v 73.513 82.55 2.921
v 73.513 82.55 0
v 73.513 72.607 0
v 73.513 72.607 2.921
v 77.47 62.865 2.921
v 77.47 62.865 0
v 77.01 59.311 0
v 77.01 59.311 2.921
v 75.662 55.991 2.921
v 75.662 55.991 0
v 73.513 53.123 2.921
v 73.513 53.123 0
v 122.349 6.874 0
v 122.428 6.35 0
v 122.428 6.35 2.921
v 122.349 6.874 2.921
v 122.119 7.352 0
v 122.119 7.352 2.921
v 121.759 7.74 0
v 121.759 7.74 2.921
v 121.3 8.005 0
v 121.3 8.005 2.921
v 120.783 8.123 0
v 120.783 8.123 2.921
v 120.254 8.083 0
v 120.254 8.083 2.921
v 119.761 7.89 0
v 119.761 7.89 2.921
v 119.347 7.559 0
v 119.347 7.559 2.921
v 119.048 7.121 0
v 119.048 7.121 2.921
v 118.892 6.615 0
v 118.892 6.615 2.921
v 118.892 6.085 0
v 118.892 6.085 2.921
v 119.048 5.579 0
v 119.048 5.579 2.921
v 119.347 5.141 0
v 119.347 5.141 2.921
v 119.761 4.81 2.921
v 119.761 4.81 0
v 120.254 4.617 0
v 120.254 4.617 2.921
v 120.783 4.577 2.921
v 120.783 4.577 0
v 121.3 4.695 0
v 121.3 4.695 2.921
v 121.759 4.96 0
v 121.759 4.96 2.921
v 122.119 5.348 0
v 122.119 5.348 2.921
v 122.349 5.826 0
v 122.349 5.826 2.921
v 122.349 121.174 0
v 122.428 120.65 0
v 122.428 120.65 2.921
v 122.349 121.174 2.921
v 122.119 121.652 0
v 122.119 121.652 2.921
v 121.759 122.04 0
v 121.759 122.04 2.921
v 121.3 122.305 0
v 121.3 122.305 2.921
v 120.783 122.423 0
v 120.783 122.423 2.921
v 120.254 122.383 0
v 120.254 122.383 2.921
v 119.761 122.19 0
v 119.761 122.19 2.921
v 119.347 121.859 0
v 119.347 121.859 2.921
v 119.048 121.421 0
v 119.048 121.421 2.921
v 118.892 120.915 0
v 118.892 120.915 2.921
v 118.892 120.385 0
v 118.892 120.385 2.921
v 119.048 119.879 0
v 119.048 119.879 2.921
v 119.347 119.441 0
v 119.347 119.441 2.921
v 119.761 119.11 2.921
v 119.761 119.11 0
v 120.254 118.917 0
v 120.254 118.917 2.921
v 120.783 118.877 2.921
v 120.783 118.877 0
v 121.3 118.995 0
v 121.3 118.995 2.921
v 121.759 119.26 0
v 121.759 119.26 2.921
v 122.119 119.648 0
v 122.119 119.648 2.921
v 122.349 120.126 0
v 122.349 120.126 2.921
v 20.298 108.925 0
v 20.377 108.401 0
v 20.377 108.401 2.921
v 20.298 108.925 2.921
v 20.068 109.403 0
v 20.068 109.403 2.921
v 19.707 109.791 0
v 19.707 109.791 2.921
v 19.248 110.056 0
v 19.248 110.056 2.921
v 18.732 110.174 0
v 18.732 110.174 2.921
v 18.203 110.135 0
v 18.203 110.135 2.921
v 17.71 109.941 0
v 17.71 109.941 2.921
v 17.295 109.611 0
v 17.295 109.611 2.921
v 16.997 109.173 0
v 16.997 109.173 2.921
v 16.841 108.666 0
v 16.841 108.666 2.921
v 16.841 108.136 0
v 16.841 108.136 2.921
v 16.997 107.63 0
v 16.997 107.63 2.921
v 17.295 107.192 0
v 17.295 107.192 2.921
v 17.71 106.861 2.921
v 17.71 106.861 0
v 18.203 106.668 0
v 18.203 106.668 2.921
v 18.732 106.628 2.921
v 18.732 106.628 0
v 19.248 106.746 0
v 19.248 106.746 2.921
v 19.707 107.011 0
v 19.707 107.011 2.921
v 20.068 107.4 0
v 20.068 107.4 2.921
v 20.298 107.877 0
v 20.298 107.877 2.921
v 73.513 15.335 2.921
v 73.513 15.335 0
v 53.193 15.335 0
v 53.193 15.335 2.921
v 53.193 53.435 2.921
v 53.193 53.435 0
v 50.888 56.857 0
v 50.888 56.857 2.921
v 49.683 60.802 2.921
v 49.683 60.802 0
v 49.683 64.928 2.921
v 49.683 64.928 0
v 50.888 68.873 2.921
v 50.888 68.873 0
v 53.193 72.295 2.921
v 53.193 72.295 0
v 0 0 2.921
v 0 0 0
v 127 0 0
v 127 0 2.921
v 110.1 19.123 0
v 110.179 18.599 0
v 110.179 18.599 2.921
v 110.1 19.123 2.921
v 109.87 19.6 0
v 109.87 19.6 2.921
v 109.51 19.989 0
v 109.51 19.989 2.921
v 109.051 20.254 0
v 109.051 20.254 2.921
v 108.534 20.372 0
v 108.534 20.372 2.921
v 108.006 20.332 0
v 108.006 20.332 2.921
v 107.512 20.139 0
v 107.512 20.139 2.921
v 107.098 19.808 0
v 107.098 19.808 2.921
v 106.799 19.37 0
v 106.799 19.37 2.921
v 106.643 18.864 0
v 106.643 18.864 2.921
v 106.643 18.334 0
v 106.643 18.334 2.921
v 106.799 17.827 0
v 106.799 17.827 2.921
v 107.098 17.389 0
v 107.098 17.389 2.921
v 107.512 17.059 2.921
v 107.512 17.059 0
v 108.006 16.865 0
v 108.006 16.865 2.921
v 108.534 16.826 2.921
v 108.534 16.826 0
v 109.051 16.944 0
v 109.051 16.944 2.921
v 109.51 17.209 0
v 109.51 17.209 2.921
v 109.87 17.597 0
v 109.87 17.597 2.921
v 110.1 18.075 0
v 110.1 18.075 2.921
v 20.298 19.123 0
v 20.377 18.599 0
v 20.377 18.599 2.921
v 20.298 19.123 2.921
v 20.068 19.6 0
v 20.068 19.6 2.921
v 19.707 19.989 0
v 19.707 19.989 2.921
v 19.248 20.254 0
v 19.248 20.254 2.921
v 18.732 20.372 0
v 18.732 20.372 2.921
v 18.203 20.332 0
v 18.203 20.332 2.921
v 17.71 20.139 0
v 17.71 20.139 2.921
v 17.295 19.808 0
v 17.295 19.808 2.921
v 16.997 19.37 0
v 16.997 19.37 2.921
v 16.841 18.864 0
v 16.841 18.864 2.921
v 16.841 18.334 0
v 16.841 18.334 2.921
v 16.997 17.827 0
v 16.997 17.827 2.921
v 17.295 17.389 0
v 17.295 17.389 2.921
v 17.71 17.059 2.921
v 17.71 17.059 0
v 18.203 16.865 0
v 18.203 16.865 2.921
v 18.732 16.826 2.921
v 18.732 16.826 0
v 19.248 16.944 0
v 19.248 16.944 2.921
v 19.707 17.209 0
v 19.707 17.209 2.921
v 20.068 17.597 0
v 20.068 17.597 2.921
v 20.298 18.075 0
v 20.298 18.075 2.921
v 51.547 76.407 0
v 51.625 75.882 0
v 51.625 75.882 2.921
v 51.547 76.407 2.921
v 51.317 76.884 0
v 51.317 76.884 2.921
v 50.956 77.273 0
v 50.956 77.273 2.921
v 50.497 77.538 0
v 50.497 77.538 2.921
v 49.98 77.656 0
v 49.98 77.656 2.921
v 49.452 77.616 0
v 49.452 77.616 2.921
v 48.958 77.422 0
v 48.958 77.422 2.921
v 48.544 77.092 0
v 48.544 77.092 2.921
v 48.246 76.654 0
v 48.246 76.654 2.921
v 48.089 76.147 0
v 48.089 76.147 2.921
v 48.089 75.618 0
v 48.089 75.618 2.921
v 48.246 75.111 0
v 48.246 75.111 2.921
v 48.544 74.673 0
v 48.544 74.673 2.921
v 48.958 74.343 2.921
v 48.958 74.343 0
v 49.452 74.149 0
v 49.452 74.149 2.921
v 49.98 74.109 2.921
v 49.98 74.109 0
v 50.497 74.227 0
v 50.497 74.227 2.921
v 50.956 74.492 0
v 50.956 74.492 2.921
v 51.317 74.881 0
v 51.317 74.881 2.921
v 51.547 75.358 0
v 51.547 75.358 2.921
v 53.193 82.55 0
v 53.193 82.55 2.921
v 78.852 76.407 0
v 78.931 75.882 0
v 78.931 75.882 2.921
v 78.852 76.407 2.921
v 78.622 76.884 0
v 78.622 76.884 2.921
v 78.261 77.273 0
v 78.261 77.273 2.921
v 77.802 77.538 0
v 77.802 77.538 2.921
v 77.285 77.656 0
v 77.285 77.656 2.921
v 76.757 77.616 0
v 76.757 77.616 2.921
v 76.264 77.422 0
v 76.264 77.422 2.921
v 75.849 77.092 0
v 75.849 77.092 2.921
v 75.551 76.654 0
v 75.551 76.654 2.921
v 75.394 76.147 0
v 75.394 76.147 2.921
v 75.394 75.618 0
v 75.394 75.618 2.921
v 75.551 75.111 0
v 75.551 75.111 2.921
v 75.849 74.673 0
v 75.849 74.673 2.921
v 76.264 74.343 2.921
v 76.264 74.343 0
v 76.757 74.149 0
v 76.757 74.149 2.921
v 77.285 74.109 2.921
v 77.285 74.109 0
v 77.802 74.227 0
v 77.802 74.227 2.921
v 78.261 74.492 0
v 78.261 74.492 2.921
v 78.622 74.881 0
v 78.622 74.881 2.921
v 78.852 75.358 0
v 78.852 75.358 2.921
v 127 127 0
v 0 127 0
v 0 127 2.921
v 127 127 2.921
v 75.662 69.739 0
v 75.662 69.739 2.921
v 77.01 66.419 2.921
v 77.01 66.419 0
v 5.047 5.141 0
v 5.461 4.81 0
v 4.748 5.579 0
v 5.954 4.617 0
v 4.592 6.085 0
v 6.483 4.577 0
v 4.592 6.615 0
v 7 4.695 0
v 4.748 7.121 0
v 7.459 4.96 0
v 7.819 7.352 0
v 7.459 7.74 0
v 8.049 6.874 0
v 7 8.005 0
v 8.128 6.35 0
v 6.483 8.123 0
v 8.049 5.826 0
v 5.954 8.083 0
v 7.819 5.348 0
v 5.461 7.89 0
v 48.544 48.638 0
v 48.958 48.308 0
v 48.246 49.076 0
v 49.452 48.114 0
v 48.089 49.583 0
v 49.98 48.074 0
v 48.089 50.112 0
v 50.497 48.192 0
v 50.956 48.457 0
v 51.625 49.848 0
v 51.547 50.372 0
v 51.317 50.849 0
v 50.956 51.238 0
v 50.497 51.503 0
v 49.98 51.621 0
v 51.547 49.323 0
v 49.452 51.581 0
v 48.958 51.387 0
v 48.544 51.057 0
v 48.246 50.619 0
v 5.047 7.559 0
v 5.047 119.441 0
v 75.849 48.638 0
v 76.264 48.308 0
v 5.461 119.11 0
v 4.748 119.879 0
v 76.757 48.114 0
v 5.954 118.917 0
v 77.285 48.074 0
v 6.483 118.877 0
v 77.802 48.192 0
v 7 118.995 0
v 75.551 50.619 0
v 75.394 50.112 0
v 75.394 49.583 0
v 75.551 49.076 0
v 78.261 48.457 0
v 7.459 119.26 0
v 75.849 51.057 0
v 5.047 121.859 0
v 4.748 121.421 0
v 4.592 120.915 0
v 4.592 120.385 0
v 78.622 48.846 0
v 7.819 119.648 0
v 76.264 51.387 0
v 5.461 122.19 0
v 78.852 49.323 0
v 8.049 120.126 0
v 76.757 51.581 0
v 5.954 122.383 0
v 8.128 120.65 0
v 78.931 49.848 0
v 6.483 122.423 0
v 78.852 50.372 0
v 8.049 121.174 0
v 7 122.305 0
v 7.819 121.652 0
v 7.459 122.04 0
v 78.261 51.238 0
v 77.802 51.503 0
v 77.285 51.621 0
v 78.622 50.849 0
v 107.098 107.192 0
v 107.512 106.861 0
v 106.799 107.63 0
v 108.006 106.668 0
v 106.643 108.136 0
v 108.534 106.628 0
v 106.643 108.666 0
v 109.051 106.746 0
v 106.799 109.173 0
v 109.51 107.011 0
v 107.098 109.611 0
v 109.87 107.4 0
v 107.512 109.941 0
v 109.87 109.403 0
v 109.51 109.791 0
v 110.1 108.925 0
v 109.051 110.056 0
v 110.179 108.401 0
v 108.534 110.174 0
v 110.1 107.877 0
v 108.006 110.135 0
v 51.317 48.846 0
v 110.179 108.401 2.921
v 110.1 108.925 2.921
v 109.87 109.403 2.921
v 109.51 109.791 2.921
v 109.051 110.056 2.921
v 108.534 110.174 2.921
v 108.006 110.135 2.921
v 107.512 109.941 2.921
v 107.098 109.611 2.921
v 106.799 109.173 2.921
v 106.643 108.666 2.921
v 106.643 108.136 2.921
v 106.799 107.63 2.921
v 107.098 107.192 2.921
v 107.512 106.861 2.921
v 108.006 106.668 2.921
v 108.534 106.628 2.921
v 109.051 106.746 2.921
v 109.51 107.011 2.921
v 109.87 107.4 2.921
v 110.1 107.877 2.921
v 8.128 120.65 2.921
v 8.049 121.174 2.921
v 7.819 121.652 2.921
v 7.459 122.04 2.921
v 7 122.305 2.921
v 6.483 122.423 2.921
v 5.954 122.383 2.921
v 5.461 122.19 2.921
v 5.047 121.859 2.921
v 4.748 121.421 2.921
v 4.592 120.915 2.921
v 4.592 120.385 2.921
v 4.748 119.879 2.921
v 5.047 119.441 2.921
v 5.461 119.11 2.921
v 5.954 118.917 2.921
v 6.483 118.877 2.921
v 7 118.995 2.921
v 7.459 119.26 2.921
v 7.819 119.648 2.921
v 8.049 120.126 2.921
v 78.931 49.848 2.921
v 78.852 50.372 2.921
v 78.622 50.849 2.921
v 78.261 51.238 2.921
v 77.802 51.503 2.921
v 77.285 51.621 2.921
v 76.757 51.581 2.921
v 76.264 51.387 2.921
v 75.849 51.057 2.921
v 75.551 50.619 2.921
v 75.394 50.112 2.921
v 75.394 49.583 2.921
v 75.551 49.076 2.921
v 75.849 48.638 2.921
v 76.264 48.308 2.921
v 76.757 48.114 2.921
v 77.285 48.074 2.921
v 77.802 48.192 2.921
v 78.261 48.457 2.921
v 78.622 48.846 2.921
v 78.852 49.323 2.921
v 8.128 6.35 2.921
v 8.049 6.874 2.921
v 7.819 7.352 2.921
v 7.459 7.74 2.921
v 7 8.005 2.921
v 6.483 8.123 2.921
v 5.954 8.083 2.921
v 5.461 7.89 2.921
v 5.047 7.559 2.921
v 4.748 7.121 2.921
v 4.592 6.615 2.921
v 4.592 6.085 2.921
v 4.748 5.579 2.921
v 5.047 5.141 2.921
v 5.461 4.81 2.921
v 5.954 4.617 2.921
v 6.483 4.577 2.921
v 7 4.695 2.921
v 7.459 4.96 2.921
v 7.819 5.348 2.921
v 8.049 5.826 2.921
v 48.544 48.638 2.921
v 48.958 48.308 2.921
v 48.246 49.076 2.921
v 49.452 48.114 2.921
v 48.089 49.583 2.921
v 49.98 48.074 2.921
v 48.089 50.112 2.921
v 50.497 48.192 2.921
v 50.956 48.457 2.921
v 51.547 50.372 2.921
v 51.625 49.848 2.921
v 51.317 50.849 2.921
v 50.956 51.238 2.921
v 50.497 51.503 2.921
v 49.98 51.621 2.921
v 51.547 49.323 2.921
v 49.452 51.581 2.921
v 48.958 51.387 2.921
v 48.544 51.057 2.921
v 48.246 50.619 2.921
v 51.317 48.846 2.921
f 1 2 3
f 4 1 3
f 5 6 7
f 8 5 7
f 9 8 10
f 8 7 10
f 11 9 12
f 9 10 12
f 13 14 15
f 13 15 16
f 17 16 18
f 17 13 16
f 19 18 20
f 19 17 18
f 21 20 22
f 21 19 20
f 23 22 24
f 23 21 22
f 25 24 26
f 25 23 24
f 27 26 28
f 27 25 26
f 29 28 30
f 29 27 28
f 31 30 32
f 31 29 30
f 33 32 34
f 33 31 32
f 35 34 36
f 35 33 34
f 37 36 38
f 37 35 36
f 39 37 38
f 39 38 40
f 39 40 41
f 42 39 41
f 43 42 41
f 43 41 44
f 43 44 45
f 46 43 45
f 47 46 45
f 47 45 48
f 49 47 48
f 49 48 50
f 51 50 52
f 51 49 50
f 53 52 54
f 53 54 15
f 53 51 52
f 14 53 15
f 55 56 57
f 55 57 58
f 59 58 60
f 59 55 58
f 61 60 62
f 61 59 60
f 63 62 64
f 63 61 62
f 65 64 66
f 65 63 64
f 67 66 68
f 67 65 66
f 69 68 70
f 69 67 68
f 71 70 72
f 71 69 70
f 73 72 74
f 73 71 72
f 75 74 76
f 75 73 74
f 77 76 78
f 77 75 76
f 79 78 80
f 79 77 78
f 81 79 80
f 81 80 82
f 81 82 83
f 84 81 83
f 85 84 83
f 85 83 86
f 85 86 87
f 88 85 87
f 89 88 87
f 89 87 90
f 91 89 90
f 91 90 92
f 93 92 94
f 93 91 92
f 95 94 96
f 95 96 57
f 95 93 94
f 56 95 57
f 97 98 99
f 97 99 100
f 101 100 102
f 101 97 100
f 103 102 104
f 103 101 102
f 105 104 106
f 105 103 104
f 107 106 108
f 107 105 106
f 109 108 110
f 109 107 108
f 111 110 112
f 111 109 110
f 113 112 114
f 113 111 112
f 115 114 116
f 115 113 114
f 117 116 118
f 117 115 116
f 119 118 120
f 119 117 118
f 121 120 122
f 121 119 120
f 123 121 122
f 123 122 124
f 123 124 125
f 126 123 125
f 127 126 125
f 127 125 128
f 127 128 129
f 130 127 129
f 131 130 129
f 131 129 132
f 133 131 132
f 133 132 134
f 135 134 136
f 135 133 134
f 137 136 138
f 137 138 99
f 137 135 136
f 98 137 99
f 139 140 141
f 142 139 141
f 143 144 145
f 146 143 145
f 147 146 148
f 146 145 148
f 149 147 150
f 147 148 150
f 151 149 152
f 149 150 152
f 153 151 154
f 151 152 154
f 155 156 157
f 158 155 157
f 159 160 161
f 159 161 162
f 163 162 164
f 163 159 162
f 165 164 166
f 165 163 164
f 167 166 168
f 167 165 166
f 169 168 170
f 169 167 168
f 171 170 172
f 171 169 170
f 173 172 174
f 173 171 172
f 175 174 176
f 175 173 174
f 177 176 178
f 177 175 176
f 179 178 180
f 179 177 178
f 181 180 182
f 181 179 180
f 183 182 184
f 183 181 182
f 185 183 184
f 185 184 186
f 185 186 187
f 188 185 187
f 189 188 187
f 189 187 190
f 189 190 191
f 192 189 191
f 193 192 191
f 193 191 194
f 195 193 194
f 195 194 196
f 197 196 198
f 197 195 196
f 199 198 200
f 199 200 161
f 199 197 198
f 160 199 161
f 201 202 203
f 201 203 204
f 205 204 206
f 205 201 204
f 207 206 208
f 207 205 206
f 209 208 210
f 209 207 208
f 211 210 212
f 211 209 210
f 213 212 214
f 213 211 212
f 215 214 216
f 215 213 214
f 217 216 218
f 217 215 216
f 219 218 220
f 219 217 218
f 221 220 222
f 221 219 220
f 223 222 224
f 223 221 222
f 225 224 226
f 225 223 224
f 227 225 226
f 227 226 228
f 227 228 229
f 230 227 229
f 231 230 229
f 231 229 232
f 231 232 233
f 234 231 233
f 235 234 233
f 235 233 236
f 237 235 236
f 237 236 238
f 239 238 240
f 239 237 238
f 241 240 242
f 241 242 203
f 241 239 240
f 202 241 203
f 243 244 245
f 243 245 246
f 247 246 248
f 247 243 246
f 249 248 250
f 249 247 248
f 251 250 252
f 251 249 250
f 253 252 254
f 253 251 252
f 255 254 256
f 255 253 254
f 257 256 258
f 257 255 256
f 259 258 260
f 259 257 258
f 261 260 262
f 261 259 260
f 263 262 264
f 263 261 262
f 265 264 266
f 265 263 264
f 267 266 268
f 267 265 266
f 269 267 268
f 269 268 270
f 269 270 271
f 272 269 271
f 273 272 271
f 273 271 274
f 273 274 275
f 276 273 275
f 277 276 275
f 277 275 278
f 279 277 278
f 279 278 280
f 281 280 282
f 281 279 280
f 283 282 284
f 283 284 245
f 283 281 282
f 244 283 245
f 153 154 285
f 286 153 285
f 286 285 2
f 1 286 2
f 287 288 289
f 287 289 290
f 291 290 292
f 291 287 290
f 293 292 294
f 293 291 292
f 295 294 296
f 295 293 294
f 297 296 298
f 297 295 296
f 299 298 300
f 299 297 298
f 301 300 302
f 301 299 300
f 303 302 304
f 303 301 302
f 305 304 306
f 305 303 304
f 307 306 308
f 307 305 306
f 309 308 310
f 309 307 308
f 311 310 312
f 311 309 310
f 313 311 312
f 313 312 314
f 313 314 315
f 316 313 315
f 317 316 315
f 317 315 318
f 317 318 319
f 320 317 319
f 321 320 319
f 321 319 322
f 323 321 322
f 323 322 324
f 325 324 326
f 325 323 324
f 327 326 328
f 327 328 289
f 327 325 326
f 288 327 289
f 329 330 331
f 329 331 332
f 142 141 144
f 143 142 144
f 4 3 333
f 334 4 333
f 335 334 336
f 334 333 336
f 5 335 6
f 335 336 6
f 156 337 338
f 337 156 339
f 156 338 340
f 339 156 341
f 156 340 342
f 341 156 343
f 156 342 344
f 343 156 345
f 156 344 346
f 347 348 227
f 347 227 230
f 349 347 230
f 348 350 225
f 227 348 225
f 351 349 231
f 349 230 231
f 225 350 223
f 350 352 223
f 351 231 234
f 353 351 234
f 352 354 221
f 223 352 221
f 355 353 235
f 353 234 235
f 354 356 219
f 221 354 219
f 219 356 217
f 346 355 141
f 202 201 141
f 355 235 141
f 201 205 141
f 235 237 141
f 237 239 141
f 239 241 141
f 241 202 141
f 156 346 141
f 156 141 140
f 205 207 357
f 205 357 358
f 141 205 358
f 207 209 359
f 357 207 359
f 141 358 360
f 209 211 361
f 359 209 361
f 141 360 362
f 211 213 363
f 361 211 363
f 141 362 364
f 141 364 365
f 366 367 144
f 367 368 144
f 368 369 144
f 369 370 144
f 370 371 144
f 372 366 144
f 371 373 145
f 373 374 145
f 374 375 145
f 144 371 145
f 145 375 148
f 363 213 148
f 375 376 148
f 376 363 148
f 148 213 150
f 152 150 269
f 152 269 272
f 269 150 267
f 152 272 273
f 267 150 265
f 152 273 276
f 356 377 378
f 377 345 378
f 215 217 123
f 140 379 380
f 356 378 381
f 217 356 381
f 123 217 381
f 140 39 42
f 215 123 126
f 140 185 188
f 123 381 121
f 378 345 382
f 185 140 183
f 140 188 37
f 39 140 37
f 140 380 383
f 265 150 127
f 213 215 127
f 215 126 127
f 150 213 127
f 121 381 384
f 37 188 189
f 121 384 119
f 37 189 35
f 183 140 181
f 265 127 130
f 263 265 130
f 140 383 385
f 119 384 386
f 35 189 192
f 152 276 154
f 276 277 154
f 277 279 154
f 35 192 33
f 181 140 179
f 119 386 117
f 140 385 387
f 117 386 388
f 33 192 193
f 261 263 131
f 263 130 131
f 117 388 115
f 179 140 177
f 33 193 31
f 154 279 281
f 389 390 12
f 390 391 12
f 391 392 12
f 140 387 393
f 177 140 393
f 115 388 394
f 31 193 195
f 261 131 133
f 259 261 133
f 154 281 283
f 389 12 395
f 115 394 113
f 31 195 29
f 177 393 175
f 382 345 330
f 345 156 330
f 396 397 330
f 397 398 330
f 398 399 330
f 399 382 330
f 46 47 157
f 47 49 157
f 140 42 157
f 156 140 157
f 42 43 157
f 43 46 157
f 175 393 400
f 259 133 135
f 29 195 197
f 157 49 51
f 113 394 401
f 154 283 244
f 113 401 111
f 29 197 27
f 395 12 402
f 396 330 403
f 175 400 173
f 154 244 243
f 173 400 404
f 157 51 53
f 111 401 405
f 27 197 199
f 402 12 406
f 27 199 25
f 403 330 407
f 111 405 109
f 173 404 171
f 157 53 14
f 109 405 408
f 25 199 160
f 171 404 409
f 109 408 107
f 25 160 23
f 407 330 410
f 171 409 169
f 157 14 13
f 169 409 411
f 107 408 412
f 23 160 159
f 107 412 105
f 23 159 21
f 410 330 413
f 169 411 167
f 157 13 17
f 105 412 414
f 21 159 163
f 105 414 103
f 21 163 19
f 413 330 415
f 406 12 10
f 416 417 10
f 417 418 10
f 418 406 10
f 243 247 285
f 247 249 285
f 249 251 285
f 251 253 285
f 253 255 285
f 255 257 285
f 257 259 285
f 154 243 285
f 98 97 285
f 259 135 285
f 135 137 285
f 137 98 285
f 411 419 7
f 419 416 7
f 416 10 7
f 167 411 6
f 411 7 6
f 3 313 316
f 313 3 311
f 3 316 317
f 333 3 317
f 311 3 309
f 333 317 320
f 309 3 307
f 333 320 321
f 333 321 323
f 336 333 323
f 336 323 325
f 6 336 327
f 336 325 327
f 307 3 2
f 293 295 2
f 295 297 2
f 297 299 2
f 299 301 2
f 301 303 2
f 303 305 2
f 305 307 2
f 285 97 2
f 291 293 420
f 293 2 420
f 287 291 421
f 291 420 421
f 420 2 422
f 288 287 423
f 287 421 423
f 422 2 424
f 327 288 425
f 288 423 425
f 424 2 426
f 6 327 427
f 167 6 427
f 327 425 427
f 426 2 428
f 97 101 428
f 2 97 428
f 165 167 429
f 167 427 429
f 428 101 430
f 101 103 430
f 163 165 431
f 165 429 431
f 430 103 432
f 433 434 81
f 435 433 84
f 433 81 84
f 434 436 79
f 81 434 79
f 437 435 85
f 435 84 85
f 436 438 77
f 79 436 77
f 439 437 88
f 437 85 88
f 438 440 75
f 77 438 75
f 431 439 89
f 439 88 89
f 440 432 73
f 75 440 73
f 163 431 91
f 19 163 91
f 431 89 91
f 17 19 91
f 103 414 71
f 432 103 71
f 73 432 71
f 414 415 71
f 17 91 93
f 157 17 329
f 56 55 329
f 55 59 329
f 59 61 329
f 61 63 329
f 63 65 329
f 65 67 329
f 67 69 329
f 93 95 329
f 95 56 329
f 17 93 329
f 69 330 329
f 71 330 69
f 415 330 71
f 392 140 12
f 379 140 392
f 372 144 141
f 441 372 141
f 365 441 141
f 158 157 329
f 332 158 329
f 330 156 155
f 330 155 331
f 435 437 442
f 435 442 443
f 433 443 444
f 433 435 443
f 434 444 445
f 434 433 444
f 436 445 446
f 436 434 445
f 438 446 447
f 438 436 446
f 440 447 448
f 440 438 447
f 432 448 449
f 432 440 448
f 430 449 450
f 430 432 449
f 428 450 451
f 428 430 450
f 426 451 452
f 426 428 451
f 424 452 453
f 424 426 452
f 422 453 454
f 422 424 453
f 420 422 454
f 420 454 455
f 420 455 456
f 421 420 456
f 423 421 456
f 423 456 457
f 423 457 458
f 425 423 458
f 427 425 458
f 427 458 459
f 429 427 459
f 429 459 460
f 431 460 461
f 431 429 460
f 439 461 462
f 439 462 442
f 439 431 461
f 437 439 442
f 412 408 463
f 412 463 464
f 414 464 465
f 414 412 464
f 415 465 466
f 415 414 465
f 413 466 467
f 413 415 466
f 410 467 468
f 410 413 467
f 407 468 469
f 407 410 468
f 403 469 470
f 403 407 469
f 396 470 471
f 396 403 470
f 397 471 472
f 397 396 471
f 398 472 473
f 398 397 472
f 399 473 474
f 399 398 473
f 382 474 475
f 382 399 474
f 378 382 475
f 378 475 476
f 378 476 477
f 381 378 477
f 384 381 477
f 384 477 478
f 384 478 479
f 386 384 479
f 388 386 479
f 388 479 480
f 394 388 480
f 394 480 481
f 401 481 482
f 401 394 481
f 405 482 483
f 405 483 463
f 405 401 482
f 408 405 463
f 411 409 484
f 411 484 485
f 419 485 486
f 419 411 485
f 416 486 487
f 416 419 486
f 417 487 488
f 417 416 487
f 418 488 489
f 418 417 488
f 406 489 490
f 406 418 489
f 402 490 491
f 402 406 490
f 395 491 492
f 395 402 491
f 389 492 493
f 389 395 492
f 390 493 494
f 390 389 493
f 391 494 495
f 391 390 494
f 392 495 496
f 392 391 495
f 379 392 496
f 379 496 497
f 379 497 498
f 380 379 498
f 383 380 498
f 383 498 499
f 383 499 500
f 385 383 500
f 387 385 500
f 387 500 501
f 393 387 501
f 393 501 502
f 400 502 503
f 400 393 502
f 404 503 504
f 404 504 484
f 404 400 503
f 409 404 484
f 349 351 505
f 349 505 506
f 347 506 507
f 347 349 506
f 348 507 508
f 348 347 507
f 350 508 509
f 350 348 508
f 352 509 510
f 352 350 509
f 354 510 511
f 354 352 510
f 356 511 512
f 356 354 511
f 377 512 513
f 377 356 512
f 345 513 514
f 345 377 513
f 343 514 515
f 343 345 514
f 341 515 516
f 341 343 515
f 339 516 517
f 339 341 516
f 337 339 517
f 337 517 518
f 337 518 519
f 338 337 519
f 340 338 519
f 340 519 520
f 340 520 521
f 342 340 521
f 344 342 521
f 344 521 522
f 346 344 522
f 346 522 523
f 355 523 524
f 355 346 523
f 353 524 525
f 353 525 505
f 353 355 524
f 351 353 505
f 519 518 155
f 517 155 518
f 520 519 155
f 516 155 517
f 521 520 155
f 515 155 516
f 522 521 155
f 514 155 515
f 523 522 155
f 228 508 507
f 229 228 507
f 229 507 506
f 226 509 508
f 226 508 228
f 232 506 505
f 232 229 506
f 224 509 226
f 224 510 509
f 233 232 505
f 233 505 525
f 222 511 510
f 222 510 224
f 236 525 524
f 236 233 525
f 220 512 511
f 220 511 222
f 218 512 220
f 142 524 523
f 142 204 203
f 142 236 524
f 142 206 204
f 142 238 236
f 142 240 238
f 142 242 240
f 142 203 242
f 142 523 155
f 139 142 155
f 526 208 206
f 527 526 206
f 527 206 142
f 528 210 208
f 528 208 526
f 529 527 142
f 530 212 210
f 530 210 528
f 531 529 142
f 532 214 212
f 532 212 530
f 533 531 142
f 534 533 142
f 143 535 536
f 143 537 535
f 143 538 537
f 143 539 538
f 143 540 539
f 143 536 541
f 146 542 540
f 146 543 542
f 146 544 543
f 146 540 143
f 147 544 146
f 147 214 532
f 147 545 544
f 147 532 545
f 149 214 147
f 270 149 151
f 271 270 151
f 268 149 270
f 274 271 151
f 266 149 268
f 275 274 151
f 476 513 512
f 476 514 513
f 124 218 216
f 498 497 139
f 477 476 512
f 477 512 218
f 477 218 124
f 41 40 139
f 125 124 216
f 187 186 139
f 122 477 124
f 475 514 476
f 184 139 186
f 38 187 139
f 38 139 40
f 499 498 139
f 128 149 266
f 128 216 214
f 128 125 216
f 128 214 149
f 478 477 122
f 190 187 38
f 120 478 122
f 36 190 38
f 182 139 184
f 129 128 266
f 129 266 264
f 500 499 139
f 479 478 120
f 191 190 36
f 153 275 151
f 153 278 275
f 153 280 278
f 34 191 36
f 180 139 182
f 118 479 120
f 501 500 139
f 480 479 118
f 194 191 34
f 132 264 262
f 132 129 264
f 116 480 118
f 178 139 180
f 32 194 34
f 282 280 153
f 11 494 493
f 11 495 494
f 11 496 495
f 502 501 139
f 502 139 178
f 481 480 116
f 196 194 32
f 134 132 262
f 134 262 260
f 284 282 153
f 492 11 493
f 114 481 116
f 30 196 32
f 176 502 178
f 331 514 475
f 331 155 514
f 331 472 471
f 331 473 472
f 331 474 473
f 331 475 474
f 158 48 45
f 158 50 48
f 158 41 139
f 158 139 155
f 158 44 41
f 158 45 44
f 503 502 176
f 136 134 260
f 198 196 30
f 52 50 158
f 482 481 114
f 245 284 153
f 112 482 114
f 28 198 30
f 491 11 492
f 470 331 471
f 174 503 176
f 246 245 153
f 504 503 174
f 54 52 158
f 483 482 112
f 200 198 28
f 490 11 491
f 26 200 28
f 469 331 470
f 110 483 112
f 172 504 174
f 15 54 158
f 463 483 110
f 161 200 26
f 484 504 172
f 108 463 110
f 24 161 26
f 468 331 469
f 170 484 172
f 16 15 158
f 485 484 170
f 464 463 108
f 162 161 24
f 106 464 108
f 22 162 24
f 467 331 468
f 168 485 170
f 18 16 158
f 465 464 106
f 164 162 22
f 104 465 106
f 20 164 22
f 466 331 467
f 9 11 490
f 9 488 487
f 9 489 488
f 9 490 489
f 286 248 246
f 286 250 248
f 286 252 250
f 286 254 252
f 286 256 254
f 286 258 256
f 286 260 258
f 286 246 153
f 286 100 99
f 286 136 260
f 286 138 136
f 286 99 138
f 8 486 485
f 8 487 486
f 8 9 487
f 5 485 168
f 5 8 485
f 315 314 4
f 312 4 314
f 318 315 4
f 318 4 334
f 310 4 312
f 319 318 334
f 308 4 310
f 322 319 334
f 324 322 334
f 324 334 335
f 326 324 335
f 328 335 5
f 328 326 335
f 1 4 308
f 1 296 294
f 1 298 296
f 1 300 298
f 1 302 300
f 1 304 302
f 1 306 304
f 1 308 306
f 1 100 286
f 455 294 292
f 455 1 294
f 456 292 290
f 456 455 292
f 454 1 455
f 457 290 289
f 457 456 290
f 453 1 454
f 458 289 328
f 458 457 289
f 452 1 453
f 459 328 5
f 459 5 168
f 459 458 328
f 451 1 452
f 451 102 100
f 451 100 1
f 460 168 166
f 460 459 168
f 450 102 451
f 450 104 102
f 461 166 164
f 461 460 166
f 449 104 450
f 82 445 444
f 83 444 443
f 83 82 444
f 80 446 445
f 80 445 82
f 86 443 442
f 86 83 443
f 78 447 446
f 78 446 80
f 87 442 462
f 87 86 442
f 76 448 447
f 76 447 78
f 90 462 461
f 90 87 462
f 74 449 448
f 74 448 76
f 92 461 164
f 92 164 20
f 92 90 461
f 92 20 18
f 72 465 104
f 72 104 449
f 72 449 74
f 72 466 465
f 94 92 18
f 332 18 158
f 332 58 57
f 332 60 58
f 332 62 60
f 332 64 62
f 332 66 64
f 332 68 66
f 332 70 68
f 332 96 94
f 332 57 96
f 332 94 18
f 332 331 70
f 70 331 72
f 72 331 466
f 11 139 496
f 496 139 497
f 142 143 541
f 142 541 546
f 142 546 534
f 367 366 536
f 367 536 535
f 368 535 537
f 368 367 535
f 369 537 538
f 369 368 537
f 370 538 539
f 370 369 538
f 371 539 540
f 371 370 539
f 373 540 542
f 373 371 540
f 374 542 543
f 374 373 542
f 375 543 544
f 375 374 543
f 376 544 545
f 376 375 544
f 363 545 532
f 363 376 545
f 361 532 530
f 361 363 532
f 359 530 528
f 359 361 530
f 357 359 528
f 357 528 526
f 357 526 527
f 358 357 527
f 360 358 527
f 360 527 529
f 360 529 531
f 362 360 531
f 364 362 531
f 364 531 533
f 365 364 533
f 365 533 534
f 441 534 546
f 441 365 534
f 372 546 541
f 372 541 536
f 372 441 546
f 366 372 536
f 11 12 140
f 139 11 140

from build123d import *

# Parameters (mm, degrees)
F0_W     = 127
F0_H     = 127
F0_R     = 1.778
F1_DEPTH = 2.921


with BuildPart() as f1:
    # F0 (on Top) → F1 (new body)
    with BuildSketch(Plane.XY):
        with Locations((63.5, 63.5)):
            Rectangle(F0_W, F0_H)
        with Locations((6.35, 6.35)):
            Circle(F0_R, mode=Mode.SUBTRACT)
        with Locations((18.598719, 18.598719)):
            Circle(F0_R, mode=Mode.SUBTRACT)
        with Locations((49.8475, 49.8475)):
            Circle(F0_R, mode=Mode.SUBTRACT)
        with Locations((120.65, 6.35)):
            Circle(F0_R, mode=Mode.SUBTRACT)
        with Locations((108.401281, 18.598719)):
            Circle(F0_R, mode=Mode.SUBTRACT)
        with BuildLine():
            Line((53.192581, 72.294635), (53.192581, 82.55))
            Line((53.192581, 82.55), (73.512581, 82.55))
            Line((73.512581, 82.55), (73.512581, 72.607131))
            ThreePointArc((73.512581, 72.607131), (76.442887, 68.12262), (77.47, 62.865))
            ThreePointArc((77.47, 62.865), (76.442887, 57.60738), (73.512581, 53.122869))
            Line((73.512581, 53.122869), (73.512581, 15.335365))
            Line((73.512581, 15.335365), (53.192581, 15.335365))
            Line((53.192581, 15.335365), (53.192581, 53.435365))
            ThreePointArc((53.192581, 53.435365), (49.53, 62.865), (53.192581, 72.294635))
        make_face(mode=Mode.SUBTRACT)
        with Locations((77.1525, 49.8475)):
            Circle(F0_R, mode=Mode.SUBTRACT)
        with Locations((49.8475, 75.8825)):
            Circle(F0_R, mode=Mode.SUBTRACT)
        with Locations((18.598719, 108.401281)):
            Circle(F0_R, mode=Mode.SUBTRACT)
        with Locations((6.35, 120.65)):
            Circle(F0_R, mode=Mode.SUBTRACT)
        with Locations((77.1525, 75.8825)):
            Circle(F0_R, mode=Mode.SUBTRACT)
        with Locations((108.401281, 108.401281)):
            Circle(F0_R, mode=Mode.SUBTRACT)
        with Locations((120.65, 120.65)):
            Circle(F0_R, mode=Mode.SUBTRACT)
    extrude(amount=F1_DEPTH)


solid = f1.part
